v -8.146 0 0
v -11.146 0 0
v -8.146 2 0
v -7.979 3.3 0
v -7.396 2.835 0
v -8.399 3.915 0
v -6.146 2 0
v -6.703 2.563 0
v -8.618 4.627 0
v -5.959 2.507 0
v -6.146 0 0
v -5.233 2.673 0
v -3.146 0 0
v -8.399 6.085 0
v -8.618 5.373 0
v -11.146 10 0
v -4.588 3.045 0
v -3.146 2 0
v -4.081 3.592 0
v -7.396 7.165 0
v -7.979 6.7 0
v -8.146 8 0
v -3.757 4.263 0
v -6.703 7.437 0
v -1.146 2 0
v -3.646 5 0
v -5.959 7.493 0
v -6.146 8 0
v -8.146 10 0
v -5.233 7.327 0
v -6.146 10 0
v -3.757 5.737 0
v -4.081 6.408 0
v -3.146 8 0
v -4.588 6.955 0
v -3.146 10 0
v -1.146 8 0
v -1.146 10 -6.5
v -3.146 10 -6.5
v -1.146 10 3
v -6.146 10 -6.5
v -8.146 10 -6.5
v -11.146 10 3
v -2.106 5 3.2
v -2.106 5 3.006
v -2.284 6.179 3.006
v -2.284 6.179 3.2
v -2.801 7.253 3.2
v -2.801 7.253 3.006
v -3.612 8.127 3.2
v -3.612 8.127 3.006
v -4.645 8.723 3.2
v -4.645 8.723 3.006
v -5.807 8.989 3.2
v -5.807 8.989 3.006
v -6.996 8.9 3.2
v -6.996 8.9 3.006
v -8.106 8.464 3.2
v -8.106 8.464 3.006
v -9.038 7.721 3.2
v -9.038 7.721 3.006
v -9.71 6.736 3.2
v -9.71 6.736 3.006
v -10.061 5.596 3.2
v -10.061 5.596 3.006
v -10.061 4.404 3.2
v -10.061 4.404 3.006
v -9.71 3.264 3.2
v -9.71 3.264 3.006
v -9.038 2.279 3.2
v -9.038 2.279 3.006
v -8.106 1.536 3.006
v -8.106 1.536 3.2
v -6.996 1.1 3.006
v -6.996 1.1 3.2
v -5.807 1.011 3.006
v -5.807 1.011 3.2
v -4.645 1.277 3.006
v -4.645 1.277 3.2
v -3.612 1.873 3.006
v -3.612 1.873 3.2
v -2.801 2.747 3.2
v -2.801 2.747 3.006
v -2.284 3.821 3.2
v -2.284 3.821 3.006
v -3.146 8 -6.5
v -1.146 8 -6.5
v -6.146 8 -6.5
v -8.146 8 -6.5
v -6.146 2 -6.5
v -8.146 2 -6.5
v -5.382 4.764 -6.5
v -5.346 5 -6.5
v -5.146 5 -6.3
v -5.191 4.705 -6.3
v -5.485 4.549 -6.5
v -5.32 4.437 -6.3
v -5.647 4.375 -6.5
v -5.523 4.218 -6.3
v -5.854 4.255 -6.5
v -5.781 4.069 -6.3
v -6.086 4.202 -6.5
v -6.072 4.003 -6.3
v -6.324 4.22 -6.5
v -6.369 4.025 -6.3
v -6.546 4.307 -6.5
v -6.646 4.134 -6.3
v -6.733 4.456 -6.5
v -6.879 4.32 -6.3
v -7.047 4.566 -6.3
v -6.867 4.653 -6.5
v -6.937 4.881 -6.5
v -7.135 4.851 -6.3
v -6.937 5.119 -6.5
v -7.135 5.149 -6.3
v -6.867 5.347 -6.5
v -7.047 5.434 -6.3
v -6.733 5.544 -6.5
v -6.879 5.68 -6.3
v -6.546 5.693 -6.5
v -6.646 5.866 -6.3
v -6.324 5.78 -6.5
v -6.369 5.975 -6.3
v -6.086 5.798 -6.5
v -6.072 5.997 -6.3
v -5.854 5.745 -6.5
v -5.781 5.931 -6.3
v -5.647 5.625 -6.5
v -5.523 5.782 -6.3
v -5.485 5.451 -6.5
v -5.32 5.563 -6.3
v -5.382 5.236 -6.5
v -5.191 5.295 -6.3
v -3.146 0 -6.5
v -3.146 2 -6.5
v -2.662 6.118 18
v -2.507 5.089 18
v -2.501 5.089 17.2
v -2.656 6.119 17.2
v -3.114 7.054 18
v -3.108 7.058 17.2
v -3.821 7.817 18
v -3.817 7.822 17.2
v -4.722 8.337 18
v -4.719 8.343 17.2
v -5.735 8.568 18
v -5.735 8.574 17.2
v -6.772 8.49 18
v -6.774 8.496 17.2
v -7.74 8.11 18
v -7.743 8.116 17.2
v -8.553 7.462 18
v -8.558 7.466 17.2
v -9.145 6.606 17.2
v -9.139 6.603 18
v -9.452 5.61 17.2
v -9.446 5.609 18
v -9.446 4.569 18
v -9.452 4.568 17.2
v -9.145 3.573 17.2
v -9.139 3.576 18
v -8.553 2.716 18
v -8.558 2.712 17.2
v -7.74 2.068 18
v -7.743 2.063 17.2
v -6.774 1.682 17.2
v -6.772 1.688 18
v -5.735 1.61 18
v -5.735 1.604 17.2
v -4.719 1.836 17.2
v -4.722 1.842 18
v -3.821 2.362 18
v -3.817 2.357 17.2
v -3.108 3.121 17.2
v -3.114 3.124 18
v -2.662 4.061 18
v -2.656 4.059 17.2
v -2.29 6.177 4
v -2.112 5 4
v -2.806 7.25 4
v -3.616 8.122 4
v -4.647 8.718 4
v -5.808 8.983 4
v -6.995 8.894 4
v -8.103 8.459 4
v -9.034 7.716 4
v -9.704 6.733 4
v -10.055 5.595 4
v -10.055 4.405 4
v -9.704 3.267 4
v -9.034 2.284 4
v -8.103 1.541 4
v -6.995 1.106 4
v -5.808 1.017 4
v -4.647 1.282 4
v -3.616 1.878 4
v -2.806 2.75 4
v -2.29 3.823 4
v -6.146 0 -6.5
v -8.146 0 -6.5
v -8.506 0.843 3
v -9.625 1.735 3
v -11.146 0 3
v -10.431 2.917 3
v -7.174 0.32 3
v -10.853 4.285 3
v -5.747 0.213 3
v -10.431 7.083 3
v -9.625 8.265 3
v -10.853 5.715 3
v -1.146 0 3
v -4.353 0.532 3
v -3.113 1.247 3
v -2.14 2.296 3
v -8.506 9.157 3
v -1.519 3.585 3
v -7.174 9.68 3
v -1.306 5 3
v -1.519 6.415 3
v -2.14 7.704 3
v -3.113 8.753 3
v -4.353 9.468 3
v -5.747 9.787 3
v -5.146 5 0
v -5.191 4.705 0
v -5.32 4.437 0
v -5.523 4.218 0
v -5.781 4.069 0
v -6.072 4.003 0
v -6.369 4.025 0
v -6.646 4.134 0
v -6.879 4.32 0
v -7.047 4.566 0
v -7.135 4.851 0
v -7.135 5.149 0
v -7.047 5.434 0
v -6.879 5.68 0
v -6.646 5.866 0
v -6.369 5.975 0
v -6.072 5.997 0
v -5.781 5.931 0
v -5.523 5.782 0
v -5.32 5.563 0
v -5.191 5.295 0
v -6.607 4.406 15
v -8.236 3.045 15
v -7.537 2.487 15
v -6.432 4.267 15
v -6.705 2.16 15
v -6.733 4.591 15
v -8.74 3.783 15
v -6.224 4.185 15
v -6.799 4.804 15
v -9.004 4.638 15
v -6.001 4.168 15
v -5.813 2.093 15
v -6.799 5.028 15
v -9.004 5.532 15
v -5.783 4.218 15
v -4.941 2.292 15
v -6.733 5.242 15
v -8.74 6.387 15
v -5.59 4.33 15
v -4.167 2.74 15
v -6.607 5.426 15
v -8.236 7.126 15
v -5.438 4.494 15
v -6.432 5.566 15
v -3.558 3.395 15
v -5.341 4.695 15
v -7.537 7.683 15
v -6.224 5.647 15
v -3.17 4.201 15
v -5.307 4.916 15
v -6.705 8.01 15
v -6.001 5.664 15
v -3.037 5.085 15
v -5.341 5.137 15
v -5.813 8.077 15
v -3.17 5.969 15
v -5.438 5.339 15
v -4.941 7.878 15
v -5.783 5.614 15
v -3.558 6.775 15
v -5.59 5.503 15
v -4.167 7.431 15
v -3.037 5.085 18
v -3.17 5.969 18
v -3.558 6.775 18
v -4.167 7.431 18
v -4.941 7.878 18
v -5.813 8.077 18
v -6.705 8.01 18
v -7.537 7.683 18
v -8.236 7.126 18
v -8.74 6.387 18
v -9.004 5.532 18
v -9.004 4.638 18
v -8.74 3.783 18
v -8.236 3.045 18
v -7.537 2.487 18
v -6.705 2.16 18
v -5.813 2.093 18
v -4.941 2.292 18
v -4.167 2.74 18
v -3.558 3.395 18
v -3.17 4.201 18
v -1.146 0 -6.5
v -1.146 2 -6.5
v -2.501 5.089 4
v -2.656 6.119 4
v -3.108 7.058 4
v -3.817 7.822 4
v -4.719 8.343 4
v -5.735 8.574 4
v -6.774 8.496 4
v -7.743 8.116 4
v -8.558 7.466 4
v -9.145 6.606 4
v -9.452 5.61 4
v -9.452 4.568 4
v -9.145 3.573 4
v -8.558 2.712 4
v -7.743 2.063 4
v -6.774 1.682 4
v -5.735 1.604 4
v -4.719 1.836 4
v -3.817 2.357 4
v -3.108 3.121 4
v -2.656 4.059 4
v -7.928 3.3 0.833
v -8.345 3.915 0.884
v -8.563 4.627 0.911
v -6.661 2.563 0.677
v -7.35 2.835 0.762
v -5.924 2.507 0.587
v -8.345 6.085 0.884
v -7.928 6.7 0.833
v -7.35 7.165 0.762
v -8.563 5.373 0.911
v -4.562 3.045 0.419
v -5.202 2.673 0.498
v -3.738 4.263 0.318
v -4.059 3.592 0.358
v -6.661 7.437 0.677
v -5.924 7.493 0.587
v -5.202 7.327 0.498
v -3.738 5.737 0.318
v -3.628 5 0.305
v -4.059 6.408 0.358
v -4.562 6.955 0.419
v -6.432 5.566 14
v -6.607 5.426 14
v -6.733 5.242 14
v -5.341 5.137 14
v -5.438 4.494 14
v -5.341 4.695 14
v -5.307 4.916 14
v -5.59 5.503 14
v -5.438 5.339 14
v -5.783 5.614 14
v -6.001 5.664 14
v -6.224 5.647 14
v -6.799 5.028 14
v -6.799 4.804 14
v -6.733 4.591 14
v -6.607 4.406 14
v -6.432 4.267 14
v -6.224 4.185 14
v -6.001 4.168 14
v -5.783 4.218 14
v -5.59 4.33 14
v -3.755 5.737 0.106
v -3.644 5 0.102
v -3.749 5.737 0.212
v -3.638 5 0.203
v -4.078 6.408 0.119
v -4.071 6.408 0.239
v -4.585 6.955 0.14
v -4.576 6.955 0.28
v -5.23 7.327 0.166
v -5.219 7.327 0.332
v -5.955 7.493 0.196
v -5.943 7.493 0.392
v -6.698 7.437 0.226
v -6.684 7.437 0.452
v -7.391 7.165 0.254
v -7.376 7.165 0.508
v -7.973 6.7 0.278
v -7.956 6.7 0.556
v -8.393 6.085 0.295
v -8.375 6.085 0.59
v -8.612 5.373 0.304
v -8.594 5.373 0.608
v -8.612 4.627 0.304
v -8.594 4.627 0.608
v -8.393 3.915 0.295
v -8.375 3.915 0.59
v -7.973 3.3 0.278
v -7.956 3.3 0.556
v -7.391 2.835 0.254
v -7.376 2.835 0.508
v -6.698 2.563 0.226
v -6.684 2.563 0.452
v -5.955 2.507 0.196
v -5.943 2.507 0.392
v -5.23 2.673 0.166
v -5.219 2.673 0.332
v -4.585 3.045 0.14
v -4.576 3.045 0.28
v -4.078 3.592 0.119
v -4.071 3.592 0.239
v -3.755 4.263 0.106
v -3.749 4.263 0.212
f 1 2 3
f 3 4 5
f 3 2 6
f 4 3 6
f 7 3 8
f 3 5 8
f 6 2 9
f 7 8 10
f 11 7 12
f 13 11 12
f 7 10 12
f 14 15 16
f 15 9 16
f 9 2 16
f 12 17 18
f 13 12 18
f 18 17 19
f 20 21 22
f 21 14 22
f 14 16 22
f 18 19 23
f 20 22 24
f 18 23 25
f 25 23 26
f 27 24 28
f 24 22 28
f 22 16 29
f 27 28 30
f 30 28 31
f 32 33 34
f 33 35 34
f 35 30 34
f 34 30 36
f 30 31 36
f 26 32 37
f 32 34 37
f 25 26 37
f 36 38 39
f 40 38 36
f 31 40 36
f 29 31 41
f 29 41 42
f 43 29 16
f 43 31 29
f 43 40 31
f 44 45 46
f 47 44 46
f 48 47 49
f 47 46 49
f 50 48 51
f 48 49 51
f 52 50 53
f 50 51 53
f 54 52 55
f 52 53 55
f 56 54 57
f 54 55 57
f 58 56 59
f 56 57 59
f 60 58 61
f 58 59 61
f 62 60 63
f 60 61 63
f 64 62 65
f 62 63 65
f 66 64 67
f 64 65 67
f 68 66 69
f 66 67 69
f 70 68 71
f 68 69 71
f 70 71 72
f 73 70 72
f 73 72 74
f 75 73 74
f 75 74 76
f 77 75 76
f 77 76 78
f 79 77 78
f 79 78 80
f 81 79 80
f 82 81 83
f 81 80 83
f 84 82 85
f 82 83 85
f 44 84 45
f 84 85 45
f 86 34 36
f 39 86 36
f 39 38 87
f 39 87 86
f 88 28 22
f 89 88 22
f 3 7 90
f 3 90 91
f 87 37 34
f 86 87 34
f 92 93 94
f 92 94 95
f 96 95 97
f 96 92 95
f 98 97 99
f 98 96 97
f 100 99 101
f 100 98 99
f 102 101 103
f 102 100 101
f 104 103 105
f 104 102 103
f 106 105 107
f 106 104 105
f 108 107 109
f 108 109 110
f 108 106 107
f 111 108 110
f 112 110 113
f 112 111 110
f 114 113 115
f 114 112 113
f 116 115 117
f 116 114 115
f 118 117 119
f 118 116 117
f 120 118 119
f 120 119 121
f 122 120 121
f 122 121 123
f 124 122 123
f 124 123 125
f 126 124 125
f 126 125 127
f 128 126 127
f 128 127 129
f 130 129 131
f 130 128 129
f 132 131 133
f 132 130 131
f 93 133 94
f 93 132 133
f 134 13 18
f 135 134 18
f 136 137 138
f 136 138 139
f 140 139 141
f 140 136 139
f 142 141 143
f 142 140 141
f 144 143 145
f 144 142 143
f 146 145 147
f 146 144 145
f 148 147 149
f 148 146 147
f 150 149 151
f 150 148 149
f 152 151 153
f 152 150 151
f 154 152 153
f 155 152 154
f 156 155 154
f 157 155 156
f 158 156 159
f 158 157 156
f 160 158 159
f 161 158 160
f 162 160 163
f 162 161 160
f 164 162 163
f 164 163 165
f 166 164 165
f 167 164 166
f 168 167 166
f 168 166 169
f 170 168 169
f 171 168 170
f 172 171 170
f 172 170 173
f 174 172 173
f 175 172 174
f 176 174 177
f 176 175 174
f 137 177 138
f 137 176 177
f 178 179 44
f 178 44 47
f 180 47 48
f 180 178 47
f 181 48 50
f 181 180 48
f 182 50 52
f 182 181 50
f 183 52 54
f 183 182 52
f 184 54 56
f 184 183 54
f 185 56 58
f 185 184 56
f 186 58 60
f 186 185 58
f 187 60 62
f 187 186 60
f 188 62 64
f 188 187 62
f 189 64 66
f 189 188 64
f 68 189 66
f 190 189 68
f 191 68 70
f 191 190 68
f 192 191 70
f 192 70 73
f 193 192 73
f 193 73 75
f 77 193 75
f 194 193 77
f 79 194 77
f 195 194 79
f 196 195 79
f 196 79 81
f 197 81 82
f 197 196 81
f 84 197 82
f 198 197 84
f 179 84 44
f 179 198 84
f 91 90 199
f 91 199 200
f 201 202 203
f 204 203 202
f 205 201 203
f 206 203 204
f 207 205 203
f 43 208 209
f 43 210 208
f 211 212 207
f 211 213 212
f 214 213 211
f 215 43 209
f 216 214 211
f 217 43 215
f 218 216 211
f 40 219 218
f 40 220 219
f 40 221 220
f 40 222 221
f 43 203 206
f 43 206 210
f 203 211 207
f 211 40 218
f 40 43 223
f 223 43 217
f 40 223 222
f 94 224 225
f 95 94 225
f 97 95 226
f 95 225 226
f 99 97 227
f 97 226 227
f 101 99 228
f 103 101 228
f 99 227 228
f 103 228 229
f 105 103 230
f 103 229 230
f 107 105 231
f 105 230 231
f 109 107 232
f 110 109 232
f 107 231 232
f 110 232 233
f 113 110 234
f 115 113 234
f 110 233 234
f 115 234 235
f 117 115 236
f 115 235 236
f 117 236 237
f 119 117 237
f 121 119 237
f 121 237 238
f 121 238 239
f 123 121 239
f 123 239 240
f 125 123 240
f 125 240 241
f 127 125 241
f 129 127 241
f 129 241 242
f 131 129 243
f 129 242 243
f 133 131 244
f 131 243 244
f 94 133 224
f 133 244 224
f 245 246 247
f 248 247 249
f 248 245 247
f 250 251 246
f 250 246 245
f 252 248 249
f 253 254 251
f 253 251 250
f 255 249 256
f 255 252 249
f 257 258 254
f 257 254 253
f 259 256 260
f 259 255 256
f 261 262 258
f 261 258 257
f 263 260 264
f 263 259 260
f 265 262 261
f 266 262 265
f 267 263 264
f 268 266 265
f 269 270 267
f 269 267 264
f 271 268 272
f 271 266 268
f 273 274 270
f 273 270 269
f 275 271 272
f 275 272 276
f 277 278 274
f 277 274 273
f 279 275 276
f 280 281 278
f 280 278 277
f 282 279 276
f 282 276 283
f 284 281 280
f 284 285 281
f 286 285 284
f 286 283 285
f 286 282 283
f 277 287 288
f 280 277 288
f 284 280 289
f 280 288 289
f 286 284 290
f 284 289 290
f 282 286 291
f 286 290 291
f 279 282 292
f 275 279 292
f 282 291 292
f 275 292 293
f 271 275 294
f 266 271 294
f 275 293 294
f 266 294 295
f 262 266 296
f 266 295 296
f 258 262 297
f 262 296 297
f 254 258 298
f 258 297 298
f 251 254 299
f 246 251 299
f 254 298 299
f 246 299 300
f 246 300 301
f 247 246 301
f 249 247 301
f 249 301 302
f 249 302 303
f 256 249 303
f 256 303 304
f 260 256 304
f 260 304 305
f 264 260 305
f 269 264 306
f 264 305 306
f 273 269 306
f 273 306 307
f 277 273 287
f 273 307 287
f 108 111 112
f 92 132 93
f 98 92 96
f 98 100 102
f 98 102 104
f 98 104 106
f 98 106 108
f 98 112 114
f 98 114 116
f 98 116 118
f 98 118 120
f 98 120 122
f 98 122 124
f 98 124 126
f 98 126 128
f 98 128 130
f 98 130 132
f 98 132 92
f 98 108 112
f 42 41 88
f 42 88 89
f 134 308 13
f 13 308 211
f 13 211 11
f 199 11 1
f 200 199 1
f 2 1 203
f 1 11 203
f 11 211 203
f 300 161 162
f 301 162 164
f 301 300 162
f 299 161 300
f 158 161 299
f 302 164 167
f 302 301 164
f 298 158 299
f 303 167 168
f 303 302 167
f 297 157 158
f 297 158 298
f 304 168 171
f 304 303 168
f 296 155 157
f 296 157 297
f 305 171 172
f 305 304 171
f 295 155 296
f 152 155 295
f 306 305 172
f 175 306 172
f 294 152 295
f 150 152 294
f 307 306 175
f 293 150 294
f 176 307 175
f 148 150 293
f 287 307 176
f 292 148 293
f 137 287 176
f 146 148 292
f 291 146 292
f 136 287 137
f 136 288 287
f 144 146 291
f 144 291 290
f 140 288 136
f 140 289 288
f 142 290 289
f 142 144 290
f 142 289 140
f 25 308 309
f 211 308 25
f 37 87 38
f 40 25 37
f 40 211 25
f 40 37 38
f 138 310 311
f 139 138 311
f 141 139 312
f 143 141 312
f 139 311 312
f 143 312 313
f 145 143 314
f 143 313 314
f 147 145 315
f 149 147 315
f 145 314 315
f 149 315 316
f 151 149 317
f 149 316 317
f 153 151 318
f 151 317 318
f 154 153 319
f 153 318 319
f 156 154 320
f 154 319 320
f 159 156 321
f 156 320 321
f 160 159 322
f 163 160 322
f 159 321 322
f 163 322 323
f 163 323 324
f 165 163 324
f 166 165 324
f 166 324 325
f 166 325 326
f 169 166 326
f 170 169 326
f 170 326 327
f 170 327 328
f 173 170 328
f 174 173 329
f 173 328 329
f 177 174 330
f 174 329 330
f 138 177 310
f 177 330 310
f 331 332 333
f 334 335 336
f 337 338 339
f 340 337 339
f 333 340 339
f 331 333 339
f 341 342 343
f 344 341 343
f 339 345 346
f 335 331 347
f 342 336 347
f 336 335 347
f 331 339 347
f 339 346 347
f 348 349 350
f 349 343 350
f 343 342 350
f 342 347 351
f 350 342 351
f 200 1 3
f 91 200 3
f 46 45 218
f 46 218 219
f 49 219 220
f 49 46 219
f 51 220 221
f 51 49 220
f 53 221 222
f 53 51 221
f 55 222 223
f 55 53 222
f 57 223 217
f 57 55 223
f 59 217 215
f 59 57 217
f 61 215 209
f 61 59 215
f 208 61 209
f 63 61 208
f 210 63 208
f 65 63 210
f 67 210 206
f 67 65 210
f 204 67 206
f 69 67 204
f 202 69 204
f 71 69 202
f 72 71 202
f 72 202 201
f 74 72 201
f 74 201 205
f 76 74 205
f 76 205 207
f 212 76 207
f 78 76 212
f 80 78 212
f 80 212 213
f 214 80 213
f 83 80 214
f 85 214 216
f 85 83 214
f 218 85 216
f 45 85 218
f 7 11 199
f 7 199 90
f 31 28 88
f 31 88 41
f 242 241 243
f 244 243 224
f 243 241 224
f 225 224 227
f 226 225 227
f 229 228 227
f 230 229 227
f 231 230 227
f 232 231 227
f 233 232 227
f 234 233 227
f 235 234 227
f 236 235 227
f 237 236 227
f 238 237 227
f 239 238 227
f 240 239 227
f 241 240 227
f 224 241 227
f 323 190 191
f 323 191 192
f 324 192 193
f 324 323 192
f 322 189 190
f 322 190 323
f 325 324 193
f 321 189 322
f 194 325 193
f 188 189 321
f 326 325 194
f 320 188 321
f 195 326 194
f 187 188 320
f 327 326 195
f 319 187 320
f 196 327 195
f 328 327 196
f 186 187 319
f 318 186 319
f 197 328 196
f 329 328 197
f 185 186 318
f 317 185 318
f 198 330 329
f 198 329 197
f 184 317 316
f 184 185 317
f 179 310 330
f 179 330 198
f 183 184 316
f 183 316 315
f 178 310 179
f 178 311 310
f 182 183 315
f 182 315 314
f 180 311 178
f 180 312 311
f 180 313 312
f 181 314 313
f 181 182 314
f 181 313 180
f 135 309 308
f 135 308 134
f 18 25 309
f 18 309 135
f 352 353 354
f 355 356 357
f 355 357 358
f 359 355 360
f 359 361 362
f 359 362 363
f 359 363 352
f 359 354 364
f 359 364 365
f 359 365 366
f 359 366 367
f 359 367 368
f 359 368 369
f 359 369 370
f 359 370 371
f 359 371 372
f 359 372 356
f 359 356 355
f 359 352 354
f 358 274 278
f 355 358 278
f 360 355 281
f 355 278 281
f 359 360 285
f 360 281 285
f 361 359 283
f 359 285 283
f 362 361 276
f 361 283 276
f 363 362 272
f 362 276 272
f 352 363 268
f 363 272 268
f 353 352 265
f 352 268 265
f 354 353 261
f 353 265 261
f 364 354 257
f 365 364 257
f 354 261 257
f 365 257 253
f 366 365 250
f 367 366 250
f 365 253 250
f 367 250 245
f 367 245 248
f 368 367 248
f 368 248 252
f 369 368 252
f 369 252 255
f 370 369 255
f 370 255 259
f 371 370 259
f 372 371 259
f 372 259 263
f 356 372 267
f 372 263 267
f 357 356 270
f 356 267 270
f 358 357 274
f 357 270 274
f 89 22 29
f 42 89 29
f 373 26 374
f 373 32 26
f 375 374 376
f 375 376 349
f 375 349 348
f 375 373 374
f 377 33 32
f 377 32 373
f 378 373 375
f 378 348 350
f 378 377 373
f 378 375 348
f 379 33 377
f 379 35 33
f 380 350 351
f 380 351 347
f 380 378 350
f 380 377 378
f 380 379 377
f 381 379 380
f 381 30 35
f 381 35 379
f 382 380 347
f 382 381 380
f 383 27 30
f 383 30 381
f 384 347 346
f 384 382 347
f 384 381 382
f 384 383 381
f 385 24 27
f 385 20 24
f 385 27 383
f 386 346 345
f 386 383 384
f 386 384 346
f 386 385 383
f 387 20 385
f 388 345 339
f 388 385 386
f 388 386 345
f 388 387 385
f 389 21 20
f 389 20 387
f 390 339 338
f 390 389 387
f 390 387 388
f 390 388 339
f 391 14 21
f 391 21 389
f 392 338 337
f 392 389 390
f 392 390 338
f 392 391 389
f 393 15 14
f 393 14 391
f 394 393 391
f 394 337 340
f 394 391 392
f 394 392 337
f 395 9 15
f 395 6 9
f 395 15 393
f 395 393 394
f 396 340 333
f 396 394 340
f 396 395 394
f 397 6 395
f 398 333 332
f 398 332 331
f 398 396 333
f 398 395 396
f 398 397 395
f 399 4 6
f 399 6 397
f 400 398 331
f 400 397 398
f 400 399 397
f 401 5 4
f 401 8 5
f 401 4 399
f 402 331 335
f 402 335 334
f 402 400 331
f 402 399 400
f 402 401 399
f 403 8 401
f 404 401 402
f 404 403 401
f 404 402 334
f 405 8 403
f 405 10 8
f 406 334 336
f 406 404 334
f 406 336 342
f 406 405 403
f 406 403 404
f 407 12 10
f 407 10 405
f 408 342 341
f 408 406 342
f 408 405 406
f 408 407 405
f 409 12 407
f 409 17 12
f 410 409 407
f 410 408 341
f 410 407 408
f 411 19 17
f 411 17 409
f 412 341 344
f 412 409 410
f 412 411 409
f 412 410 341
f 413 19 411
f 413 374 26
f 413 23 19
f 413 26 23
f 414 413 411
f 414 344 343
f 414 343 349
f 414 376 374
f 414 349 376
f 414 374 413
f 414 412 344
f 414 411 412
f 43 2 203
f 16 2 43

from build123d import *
from OCP.BRepFilletAPI import BRepFilletAPI_MakeChamfer

# Parameters (mm, degrees)
SKETCH1_W           = 10
SKETCH1_H           = 10
BOSS_EXTRUDE1_DEPTH = 3
SKETCH2_R           = 2.5
CUT_REVOLVE1_ANGLE  = 7
SKETCH3_W           = 2
SKETCH3_H           = 2
BOSS_EXTRUDE2_DEPTH = 6.5
SKETCH4_W           = 2
SKETCH4_H           = 2
BOSS_EXTRUDE3_DEPTH = 6.5
SKETCH5_W           = 2
SKETCH5_H           = 2
BOSS_EXTRUDE4_DEPTH = 6.5
SKETCH6_R           = 1
BOSS_EXTRUDE5_DEPTH = 6.5
CHAMFER2_SIZE       = 0.2
SKETCH7_R           = 4
BOSS_EXTRUDE6_DEPTH = 1
CHAMFER10_SIZE      = 0.8
CHAMFER10_SIZE2     = 0.006283315
SKETCH9_R           = 3.494836796
BOSS_EXTRUDE7_DEPTH = 14
CHAMFER11_SIZE      = 0.8
CHAMFER11_SIZE2     = 0.006283315
SKETCH11_R          = 3
CUT_EXTRUDE1_DEPTH  = 3
SKETCH12_R          = 0.75
CUT_EXTRUDE2_DEPTH  = 1


with BuildPart() as part:
    # Sketch1 → Boss-Extrude1 (new body)
    with BuildSketch(Plane.XY):
        with Locations((-6.146245059, 5)):
            Rectangle(SKETCH1_W, SKETCH1_H)
    extrude(amount=BOSS_EXTRUDE1_DEPTH)

    # Sketch2 → Cut-Revolve1 (revolve, cut)
    with BuildSketch(Plane.XY):
        with Locations((-6.146245059, 5)):
            Circle(SKETCH2_R)
    revolve(axis=Axis((-1.146245059, 0, 0), (0, 1, 0)), revolution_arc=CUT_REVOLVE1_ANGLE, mode=Mode.SUBTRACT)

    # Sketch3 → Boss-Extrude2 (add)
    with BuildSketch(Plane(origin=(0, 0, 0), x_dir=(-1, 0, 0), z_dir=(0, 0, -1))):
        with Locations((2.146245059, 1)):
            Rectangle(SKETCH3_W, SKETCH3_H)
    extrude(amount=BOSS_EXTRUDE2_DEPTH)

    # Sketch4 → Boss-Extrude3 (add)
    with BuildSketch(Plane(origin=(0, 0, 0), x_dir=(-1, 0, 0), z_dir=(0, 0, -1))):
        with Locations((7.146245059, 1)):
            Rectangle(SKETCH4_W, SKETCH4_H)
    extrude(amount=BOSS_EXTRUDE3_DEPTH)

    # Sketch5 → Boss-Extrude4 (add)
    with BuildSketch(Plane(origin=(0, 0, 0), x_dir=(-1, 0, 0), z_dir=(0, 0, -1))):
        with Locations((2.146245059, 9)):
            Rectangle(SKETCH5_W, SKETCH5_H)
        with Locations((7.146245059, 9)):
            Rectangle(SKETCH5_W, SKETCH5_H)
    extrude(amount=BOSS_EXTRUDE4_DEPTH)

    # Sketch7 → Boss-Extrude6 (add)
    with BuildSketch(Plane.XY.offset(3)):
        with Locations((-6.106175015, 5)):
            Circle(SKETCH7_R)
    extrude(amount=BOSS_EXTRUDE6_DEPTH)

    # Chamfer10: one chamfer whose edges measure the first distance from different faces: ONE call of the kernel's chamfer builder (chamfer() names one face for all edges)
    chamfer10_edges_1 = [part.edges().sort_by_distance(p)[0] for p in [
        (-10.106175015, 5, 3),
    ]]
    chamfer10_side_1 = [part.faces().sort_by_distance(p)[0] for p in [
        (-6.146245059, 0.141421356, 3),
    ]]
    chamfer10_edges_2 = [part.edges().sort_by_distance(p)[0] for p in [
        (-10.106175015, 5, 4),
    ]]
    chamfer10_side_2 = [part.faces().sort_by_distance(p)[0] for p in [
        (-10.106175015, 5, 3.5),
    ]]
    chamfer10 = BRepFilletAPI_MakeChamfer(part.part.solid().wrapped)
    for e in chamfer10_edges_1:
        chamfer10.Add(CHAMFER10_SIZE, CHAMFER10_SIZE2, e.wrapped, chamfer10_side_1[0].wrapped)  # the first distance lies on this face
    for e in chamfer10_edges_2:
        chamfer10.Add(CHAMFER10_SIZE, CHAMFER10_SIZE2, e.wrapped, chamfer10_side_2[0].wrapped)  # the first distance lies on this face
    add(Compound.cast(chamfer10.Shape()), mode=Mode.REPLACE)

    # Sketch9 → Boss-Extrude7 (add)
    with BuildSketch(Plane.XY.offset(4)):
        with Locations((-5.996019597, 5.089264212)):
            Circle(SKETCH9_R)
    extrude(amount=BOSS_EXTRUDE7_DEPTH)

    # Chamfer11
    chamfer11_edges = [part.edges().sort_by_distance(p)[0] for p in [
        (-9.490856393, 5.089264212, 18),
    ]]
    chamfer11_side = [part.faces().sort_by_distance(p)[0] for p in [
        (-9.490856393, 5.089264212, 11),
    ]]
    chamfer(chamfer11_edges, length=CHAMFER11_SIZE, length2=CHAMFER11_SIZE2, reference=chamfer11_side[0])

    # Sketch11 → Cut-Extrude1 (cut)
    with BuildSketch(Plane.XY.offset(18)):
        with Locations((-6.03702539, 5.085040529)):
            Circle(SKETCH11_R)
    extrude(amount=-CUT_EXTRUDE1_DEPTH, mode=Mode.SUBTRACT)

    # Sketch12 → Cut-Extrude2 (cut)
    with BuildSketch(Plane.XY.offset(15)):
        with Locations((-6.057436588, 4.916159933)):
            Circle(SKETCH12_R)
    extrude(amount=-CUT_EXTRUDE2_DEPTH, mode=Mode.SUBTRACT)


with BuildPart() as body_2:
    # Sketch6 → Boss-Extrude5 (new body)
    with BuildSketch(Plane(origin=(0, 0, 0), x_dir=(-1, 0, 0), z_dir=(0, 0, -1))):
        with Locations(Location((6.146245059, 5, 0), (0, 0, 180))):
            Circle(SKETCH6_R)
    extrude(amount=BOSS_EXTRUDE5_DEPTH)

    # Chamfer2
    chamfer2_edges = [body_2.edges().sort_by_distance(p)[0] for p in [
        (-7.146245059, 5, -6.5),
    ]]
    chamfer(chamfer2_edges, length=CHAMFER2_SIZE)


solid = Compound([part.part, body_2.part])
